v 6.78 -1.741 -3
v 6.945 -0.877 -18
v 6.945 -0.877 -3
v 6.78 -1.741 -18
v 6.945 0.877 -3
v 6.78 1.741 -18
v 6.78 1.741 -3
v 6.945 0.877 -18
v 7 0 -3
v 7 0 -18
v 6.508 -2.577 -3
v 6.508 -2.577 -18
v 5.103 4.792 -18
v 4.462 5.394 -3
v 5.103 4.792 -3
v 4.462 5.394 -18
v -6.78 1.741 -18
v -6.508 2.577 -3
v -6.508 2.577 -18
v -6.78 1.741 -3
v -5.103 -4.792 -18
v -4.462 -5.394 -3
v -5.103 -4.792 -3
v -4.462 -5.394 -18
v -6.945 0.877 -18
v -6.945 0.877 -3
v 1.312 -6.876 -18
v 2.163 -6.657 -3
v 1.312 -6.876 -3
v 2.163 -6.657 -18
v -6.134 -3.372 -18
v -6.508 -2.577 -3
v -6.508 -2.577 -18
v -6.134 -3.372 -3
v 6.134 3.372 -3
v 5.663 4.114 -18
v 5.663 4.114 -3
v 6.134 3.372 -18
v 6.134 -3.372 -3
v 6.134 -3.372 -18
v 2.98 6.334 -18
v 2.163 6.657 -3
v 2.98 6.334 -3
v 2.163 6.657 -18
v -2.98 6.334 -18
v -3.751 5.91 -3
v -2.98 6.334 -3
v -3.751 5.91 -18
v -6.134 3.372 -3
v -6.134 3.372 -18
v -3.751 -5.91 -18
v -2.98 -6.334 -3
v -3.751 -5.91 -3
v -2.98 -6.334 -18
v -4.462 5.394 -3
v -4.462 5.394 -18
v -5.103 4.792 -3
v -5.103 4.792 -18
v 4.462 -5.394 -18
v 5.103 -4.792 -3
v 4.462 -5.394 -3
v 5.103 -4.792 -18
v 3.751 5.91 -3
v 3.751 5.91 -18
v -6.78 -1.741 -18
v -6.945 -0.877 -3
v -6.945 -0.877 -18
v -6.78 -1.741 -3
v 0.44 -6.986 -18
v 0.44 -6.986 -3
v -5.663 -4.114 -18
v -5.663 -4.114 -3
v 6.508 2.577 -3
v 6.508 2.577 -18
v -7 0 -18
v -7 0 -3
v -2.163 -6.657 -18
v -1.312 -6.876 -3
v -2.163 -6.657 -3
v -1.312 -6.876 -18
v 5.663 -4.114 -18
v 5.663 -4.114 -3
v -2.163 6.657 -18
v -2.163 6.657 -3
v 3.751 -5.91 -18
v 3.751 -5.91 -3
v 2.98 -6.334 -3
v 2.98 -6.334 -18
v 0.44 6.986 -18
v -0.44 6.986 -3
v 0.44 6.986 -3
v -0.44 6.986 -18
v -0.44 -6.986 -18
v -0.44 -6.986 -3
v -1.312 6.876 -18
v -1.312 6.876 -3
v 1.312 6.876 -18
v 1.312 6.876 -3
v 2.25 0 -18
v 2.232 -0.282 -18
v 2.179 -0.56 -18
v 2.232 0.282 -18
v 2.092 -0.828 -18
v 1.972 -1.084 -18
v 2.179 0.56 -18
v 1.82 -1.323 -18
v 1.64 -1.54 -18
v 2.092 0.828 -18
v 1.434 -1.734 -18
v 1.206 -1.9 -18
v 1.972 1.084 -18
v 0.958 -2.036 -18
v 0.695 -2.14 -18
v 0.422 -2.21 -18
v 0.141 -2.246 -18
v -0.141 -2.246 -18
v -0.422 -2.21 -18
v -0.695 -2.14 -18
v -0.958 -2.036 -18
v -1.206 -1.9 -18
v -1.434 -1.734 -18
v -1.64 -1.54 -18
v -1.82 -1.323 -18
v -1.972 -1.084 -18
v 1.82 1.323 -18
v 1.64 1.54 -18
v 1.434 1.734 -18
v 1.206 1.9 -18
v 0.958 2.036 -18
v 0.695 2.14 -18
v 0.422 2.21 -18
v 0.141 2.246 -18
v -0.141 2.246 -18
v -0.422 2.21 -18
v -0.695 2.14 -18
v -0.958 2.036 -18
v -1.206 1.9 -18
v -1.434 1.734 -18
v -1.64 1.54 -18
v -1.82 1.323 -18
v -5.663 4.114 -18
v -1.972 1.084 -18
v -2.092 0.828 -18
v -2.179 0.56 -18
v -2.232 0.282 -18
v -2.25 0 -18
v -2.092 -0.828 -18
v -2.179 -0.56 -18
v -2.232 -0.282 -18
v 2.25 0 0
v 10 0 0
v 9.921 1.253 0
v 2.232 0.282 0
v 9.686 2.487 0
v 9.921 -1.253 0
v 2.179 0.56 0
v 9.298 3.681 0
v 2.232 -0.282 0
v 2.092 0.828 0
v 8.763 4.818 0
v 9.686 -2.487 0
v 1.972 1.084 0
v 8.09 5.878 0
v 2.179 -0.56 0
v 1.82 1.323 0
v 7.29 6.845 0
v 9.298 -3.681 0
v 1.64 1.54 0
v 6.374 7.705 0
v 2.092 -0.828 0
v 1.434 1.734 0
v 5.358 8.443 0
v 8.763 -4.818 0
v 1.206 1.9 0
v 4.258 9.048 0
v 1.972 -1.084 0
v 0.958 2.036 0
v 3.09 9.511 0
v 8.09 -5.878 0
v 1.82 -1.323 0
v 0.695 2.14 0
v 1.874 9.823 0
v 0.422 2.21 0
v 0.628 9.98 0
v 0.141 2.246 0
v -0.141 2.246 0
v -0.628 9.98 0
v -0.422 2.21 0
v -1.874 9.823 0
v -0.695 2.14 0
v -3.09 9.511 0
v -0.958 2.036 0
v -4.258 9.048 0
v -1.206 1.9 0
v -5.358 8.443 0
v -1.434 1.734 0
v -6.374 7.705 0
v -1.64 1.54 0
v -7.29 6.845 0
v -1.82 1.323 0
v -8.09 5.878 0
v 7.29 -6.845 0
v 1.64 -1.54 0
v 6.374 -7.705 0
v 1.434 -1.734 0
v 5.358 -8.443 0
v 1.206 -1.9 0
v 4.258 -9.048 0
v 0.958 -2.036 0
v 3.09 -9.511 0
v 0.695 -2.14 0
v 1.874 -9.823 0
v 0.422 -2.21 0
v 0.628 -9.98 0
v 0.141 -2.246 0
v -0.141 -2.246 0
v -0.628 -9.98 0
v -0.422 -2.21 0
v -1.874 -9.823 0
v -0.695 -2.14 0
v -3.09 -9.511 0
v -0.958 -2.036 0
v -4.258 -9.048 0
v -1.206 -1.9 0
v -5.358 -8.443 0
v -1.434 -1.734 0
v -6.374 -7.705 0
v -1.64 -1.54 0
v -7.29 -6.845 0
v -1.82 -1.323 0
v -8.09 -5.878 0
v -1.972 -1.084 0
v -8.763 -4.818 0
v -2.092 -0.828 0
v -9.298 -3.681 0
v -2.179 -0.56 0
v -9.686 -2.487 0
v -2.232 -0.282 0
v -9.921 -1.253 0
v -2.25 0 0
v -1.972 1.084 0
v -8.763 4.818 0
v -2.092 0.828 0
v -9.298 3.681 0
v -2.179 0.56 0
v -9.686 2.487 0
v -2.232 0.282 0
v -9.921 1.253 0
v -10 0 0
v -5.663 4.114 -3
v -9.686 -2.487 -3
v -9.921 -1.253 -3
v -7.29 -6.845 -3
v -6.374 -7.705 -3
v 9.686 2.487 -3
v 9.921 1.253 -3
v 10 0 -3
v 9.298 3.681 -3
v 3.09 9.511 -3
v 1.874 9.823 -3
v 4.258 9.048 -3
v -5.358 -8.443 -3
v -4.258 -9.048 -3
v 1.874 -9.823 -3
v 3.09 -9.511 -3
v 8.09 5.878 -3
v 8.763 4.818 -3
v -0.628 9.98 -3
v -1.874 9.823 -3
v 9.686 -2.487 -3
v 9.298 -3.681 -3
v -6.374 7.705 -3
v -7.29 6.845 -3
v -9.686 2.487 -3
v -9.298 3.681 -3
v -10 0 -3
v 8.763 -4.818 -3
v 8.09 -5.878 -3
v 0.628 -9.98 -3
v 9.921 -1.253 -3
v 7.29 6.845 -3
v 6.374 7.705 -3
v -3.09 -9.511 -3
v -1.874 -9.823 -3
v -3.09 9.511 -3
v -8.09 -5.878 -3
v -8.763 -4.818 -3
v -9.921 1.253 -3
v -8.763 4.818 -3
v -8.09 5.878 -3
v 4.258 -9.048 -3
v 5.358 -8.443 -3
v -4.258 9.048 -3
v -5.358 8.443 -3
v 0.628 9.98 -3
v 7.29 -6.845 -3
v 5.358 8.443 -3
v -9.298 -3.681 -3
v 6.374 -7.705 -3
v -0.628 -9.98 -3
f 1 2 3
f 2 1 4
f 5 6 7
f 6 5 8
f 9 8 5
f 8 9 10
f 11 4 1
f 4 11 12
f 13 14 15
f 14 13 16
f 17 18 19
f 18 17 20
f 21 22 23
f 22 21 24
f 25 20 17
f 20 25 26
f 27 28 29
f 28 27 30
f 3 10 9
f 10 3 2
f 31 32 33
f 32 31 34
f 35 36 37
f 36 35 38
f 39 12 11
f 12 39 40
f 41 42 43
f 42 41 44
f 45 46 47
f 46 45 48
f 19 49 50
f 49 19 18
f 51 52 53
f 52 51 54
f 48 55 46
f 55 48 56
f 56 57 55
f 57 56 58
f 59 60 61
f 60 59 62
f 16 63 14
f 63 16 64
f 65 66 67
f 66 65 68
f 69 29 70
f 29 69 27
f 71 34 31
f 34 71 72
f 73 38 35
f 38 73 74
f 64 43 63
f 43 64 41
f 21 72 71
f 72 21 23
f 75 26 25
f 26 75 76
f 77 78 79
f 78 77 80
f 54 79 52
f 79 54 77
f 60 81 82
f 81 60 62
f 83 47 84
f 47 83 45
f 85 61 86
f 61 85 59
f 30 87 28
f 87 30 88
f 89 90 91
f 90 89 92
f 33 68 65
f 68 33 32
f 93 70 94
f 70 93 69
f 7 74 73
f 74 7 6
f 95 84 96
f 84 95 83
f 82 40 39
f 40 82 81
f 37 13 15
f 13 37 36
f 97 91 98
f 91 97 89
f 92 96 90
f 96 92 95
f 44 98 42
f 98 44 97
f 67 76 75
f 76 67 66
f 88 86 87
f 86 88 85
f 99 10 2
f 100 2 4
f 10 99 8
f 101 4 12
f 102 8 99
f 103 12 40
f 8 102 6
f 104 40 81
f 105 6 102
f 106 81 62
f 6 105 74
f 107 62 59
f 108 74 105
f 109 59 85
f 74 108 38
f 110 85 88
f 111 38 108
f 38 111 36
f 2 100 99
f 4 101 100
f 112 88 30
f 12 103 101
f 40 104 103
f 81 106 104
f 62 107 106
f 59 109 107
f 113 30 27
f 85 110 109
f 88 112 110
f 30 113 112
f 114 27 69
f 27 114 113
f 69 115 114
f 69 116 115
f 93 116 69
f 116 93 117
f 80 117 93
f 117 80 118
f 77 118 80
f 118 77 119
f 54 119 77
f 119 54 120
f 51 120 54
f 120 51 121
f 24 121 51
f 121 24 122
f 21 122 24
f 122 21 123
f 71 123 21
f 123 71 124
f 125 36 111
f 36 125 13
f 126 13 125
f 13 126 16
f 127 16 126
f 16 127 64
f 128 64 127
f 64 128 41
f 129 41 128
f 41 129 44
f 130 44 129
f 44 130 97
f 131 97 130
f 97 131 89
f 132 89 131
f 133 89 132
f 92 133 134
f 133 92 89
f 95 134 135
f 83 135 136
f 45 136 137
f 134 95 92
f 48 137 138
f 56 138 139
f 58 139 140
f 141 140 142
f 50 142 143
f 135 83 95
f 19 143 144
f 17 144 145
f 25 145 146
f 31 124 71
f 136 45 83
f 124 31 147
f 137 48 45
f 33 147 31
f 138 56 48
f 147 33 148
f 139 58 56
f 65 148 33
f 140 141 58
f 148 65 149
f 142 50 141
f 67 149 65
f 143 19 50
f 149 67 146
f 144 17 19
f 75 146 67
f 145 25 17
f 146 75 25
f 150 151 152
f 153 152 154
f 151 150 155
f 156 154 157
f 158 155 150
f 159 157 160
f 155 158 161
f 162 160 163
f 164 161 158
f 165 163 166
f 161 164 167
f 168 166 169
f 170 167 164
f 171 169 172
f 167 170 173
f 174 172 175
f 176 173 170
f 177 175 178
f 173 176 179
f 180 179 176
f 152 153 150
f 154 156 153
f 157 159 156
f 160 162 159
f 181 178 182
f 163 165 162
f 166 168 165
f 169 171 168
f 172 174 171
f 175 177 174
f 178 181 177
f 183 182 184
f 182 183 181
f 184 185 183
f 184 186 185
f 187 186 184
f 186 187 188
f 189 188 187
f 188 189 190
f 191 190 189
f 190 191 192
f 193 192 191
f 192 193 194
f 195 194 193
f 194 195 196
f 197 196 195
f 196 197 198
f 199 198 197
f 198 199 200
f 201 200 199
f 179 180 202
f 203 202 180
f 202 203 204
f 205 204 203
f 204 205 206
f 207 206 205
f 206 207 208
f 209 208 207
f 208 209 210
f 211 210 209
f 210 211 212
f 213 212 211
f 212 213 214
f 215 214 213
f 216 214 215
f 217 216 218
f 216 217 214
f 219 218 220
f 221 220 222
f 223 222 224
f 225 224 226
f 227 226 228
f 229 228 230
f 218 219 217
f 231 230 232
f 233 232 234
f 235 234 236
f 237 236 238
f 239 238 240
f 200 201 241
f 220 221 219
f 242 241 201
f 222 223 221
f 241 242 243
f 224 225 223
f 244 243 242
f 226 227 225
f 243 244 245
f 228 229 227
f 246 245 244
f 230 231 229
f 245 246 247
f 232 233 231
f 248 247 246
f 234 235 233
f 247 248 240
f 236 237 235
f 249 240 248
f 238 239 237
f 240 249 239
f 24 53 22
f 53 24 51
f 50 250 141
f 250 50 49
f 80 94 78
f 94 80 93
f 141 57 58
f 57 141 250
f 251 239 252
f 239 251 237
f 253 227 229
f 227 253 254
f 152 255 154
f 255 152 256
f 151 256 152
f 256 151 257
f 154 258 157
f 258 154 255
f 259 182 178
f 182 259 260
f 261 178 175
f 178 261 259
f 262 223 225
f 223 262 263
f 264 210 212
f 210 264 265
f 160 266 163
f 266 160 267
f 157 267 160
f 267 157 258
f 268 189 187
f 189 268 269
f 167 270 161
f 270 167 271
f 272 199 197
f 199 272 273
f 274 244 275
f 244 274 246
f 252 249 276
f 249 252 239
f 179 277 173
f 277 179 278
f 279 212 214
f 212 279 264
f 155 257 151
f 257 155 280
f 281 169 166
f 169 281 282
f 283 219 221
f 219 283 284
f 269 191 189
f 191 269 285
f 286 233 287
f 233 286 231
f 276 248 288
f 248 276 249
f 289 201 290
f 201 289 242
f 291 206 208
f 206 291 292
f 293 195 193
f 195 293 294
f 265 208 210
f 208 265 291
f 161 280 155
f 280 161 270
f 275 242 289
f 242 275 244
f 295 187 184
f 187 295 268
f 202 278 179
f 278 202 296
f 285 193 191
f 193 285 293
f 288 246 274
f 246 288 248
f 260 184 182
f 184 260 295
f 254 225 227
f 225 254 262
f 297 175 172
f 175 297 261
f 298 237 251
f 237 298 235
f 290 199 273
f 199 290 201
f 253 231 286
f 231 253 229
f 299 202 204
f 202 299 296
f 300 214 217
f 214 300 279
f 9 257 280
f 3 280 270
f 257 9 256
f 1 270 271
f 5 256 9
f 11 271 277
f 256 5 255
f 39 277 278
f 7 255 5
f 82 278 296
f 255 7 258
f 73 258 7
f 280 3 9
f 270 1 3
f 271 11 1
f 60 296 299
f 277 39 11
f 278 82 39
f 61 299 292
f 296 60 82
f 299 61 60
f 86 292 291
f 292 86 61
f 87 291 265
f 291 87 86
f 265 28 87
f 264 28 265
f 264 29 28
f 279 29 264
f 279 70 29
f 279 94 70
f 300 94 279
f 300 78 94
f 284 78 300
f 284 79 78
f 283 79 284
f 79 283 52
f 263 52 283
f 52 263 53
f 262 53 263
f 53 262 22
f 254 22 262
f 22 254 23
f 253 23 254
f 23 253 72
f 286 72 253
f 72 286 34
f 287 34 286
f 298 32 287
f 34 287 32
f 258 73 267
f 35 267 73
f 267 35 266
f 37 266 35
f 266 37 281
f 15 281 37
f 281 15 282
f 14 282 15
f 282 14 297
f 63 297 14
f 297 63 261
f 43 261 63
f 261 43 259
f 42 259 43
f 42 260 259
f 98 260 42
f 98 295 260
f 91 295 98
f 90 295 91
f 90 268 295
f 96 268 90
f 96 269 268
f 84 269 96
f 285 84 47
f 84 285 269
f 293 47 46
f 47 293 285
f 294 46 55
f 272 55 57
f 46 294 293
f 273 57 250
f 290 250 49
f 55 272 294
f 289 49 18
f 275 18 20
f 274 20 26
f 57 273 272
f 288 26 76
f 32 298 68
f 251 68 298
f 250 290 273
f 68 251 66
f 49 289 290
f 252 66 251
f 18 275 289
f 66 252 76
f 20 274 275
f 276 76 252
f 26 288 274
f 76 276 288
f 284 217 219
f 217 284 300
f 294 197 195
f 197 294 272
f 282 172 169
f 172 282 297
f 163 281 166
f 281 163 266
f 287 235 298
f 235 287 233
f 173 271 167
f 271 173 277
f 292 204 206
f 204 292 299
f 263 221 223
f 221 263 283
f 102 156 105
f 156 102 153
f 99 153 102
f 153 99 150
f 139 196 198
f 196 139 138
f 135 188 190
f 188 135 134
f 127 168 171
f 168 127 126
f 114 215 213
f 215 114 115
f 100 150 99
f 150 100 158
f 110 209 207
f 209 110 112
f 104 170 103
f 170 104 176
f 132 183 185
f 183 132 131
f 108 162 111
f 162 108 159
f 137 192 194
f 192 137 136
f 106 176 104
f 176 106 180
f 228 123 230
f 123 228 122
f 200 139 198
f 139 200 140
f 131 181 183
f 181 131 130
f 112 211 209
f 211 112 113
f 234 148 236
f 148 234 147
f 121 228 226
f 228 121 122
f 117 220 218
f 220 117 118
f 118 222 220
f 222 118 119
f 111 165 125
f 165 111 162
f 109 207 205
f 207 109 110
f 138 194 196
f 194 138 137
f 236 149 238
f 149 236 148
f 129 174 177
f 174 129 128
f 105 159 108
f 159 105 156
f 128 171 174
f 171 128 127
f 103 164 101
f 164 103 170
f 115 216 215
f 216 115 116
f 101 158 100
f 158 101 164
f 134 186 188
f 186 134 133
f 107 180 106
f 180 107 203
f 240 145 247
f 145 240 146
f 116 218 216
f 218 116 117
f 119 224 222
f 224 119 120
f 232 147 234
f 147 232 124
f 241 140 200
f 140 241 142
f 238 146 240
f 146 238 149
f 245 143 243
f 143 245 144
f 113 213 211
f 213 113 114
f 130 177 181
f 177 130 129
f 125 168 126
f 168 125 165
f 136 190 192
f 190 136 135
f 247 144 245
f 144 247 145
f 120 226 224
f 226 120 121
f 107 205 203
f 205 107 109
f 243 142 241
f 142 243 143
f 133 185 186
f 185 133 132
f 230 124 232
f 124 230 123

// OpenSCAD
$fn = 50;


difference() {
	union() {
		translate(v = [0, 0, -18.0000000000]) {
			cylinder(h = 18, r = 7.0000000000);
		}
		translate(v = [0, 0, -3.0000000000]) {
			cylinder(h = 3, r = 10.0000000000);
		}
	}
	union() {
		#translate(v = [0, 0, -18]) {
			cylinder(h = 18, r = 2.2500000000);
		}
	}
}
